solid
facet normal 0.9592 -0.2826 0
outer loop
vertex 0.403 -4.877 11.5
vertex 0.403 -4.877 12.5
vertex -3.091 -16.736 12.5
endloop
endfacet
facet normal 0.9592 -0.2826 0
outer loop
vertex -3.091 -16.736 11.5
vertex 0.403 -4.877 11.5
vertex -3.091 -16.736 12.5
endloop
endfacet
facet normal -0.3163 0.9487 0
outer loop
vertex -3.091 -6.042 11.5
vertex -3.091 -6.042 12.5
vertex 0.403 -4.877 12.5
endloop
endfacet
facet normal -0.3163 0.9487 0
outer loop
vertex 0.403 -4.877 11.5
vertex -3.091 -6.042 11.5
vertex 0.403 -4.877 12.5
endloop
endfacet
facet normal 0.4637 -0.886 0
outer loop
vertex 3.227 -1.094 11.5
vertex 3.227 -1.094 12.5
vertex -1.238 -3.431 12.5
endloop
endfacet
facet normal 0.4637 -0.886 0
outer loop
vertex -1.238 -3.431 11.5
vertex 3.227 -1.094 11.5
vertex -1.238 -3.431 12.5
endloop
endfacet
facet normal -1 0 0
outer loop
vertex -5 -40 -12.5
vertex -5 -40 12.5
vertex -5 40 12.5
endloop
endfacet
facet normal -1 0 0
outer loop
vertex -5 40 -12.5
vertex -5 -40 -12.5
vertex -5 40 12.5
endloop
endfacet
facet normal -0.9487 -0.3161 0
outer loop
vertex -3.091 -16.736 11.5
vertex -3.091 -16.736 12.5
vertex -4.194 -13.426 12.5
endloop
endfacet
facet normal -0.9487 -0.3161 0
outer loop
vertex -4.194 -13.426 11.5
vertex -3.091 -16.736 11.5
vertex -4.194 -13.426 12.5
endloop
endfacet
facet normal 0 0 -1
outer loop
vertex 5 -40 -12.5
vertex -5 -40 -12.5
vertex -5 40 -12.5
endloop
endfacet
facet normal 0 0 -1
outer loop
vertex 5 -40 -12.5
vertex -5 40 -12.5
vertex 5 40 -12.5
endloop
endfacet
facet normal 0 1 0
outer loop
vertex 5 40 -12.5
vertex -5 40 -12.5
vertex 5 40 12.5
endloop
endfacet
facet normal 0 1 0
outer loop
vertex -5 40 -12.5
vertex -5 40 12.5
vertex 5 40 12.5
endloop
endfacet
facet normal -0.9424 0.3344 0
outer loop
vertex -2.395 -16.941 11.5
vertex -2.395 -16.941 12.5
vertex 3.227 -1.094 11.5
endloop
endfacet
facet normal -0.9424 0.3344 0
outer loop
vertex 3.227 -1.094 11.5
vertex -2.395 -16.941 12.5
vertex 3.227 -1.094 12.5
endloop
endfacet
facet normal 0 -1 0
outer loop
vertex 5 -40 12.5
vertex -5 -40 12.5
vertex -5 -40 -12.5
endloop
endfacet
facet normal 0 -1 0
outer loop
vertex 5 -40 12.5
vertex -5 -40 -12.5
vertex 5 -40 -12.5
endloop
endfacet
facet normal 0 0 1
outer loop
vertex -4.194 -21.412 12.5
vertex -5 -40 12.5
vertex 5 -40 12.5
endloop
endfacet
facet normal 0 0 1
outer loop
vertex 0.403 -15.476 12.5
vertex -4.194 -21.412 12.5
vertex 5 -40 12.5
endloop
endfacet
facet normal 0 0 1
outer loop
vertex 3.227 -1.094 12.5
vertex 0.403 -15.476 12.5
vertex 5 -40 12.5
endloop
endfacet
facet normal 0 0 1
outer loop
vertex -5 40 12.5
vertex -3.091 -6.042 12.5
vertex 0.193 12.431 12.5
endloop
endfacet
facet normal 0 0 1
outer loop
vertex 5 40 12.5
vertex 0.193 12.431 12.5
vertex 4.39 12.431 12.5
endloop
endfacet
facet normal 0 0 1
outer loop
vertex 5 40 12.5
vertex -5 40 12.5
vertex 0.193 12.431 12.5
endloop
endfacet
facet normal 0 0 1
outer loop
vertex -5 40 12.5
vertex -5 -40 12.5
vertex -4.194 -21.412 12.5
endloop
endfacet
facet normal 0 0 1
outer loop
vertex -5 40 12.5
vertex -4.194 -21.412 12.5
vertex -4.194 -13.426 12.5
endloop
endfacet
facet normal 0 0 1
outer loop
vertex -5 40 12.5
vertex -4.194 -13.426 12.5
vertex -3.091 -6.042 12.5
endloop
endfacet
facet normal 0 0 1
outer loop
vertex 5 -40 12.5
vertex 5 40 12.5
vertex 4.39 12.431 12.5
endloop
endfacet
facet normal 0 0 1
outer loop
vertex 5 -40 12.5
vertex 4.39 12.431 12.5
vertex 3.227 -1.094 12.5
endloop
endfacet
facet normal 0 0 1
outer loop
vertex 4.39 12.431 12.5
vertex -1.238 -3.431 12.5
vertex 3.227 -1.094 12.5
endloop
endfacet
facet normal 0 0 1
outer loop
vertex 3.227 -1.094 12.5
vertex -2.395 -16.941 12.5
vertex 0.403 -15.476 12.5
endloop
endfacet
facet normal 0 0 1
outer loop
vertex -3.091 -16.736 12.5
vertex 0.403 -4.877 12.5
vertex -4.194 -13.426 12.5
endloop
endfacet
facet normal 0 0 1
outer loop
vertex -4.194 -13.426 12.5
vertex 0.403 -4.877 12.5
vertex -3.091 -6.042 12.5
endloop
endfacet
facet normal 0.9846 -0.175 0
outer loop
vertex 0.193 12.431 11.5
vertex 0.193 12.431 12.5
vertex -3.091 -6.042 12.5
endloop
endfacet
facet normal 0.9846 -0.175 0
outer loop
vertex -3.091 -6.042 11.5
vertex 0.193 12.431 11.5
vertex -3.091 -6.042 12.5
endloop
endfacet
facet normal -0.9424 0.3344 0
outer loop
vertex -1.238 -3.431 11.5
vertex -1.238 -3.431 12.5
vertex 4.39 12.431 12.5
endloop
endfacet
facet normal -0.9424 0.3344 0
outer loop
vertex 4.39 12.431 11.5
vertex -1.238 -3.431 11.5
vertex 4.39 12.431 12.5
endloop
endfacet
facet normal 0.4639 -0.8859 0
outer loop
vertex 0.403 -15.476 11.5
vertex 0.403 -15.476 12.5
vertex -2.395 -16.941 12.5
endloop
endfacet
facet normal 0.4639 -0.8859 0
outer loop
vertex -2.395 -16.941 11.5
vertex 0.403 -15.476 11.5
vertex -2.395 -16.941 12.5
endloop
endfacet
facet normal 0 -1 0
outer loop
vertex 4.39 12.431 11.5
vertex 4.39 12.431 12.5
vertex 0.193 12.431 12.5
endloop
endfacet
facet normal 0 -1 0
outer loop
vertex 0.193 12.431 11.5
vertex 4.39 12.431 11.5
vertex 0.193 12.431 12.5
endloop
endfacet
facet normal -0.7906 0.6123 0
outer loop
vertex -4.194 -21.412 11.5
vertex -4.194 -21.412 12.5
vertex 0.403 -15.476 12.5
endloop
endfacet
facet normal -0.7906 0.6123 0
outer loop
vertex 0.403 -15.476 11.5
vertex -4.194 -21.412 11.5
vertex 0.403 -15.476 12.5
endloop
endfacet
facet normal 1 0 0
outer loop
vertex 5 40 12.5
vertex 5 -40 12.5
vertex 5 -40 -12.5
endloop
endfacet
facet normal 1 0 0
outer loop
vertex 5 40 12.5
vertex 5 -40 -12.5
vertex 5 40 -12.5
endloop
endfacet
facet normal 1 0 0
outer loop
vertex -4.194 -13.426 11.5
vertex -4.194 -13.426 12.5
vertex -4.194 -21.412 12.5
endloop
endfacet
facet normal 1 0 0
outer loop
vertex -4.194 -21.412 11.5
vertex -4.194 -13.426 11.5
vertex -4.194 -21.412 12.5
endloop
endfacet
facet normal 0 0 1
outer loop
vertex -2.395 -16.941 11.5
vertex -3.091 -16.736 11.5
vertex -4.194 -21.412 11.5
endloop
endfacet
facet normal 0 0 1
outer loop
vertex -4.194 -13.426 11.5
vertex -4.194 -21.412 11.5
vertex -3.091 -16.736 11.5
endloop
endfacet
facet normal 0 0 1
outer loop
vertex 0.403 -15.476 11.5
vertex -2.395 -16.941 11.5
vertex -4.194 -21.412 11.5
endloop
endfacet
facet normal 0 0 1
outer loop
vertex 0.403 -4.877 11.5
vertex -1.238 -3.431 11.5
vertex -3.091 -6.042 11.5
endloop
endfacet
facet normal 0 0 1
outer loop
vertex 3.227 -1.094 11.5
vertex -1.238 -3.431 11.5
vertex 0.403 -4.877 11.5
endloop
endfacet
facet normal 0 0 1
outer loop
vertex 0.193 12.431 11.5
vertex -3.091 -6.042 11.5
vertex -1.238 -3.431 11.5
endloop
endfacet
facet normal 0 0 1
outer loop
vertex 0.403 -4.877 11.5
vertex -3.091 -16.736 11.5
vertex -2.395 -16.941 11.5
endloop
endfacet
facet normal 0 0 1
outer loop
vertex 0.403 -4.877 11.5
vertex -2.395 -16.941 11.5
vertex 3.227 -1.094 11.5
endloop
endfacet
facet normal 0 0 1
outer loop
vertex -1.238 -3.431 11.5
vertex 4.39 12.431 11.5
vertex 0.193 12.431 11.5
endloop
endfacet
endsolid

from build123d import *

# Parameters (mm, degrees)
SKETCH1_W           = 10
SKETCH1_H           = 80
BOSS_EXTRUDE1_DEPTH = 12.5
CUT_EXTRUDE1_DEPTH  = 1


with BuildPart() as part:
    # Sketch1 → Boss-Extrude1 (new, symmetric)
    with BuildSketch(Plane.XY):
        Rectangle(SKETCH1_W, SKETCH1_H)
    extrude(amount=BOSS_EXTRUDE1_DEPTH, both=True)

    # Sketch2 → Cut-Extrude1 (cut)
    with BuildSketch(Plane.XY.offset(12.5)):
        Polygon((0.193183959, 12.431010412), (-3.090931772, -6.042140576), (0.403107323, -4.877460877), (-3.090931772, -16.736017806), (-4.194169453, -13.426304764), (-4.194169453, -21.412180594), (0.403107323, -15.476046132), (-2.395490823, -16.940924514), (3.226945299, -1.094134401), (-1.238032252, -3.43125061), (4.389892943, 12.431010412), align=None)
    extrude(amount=-CUT_EXTRUDE1_DEPTH, mode=Mode.SUBTRACT)


solid = part.part
